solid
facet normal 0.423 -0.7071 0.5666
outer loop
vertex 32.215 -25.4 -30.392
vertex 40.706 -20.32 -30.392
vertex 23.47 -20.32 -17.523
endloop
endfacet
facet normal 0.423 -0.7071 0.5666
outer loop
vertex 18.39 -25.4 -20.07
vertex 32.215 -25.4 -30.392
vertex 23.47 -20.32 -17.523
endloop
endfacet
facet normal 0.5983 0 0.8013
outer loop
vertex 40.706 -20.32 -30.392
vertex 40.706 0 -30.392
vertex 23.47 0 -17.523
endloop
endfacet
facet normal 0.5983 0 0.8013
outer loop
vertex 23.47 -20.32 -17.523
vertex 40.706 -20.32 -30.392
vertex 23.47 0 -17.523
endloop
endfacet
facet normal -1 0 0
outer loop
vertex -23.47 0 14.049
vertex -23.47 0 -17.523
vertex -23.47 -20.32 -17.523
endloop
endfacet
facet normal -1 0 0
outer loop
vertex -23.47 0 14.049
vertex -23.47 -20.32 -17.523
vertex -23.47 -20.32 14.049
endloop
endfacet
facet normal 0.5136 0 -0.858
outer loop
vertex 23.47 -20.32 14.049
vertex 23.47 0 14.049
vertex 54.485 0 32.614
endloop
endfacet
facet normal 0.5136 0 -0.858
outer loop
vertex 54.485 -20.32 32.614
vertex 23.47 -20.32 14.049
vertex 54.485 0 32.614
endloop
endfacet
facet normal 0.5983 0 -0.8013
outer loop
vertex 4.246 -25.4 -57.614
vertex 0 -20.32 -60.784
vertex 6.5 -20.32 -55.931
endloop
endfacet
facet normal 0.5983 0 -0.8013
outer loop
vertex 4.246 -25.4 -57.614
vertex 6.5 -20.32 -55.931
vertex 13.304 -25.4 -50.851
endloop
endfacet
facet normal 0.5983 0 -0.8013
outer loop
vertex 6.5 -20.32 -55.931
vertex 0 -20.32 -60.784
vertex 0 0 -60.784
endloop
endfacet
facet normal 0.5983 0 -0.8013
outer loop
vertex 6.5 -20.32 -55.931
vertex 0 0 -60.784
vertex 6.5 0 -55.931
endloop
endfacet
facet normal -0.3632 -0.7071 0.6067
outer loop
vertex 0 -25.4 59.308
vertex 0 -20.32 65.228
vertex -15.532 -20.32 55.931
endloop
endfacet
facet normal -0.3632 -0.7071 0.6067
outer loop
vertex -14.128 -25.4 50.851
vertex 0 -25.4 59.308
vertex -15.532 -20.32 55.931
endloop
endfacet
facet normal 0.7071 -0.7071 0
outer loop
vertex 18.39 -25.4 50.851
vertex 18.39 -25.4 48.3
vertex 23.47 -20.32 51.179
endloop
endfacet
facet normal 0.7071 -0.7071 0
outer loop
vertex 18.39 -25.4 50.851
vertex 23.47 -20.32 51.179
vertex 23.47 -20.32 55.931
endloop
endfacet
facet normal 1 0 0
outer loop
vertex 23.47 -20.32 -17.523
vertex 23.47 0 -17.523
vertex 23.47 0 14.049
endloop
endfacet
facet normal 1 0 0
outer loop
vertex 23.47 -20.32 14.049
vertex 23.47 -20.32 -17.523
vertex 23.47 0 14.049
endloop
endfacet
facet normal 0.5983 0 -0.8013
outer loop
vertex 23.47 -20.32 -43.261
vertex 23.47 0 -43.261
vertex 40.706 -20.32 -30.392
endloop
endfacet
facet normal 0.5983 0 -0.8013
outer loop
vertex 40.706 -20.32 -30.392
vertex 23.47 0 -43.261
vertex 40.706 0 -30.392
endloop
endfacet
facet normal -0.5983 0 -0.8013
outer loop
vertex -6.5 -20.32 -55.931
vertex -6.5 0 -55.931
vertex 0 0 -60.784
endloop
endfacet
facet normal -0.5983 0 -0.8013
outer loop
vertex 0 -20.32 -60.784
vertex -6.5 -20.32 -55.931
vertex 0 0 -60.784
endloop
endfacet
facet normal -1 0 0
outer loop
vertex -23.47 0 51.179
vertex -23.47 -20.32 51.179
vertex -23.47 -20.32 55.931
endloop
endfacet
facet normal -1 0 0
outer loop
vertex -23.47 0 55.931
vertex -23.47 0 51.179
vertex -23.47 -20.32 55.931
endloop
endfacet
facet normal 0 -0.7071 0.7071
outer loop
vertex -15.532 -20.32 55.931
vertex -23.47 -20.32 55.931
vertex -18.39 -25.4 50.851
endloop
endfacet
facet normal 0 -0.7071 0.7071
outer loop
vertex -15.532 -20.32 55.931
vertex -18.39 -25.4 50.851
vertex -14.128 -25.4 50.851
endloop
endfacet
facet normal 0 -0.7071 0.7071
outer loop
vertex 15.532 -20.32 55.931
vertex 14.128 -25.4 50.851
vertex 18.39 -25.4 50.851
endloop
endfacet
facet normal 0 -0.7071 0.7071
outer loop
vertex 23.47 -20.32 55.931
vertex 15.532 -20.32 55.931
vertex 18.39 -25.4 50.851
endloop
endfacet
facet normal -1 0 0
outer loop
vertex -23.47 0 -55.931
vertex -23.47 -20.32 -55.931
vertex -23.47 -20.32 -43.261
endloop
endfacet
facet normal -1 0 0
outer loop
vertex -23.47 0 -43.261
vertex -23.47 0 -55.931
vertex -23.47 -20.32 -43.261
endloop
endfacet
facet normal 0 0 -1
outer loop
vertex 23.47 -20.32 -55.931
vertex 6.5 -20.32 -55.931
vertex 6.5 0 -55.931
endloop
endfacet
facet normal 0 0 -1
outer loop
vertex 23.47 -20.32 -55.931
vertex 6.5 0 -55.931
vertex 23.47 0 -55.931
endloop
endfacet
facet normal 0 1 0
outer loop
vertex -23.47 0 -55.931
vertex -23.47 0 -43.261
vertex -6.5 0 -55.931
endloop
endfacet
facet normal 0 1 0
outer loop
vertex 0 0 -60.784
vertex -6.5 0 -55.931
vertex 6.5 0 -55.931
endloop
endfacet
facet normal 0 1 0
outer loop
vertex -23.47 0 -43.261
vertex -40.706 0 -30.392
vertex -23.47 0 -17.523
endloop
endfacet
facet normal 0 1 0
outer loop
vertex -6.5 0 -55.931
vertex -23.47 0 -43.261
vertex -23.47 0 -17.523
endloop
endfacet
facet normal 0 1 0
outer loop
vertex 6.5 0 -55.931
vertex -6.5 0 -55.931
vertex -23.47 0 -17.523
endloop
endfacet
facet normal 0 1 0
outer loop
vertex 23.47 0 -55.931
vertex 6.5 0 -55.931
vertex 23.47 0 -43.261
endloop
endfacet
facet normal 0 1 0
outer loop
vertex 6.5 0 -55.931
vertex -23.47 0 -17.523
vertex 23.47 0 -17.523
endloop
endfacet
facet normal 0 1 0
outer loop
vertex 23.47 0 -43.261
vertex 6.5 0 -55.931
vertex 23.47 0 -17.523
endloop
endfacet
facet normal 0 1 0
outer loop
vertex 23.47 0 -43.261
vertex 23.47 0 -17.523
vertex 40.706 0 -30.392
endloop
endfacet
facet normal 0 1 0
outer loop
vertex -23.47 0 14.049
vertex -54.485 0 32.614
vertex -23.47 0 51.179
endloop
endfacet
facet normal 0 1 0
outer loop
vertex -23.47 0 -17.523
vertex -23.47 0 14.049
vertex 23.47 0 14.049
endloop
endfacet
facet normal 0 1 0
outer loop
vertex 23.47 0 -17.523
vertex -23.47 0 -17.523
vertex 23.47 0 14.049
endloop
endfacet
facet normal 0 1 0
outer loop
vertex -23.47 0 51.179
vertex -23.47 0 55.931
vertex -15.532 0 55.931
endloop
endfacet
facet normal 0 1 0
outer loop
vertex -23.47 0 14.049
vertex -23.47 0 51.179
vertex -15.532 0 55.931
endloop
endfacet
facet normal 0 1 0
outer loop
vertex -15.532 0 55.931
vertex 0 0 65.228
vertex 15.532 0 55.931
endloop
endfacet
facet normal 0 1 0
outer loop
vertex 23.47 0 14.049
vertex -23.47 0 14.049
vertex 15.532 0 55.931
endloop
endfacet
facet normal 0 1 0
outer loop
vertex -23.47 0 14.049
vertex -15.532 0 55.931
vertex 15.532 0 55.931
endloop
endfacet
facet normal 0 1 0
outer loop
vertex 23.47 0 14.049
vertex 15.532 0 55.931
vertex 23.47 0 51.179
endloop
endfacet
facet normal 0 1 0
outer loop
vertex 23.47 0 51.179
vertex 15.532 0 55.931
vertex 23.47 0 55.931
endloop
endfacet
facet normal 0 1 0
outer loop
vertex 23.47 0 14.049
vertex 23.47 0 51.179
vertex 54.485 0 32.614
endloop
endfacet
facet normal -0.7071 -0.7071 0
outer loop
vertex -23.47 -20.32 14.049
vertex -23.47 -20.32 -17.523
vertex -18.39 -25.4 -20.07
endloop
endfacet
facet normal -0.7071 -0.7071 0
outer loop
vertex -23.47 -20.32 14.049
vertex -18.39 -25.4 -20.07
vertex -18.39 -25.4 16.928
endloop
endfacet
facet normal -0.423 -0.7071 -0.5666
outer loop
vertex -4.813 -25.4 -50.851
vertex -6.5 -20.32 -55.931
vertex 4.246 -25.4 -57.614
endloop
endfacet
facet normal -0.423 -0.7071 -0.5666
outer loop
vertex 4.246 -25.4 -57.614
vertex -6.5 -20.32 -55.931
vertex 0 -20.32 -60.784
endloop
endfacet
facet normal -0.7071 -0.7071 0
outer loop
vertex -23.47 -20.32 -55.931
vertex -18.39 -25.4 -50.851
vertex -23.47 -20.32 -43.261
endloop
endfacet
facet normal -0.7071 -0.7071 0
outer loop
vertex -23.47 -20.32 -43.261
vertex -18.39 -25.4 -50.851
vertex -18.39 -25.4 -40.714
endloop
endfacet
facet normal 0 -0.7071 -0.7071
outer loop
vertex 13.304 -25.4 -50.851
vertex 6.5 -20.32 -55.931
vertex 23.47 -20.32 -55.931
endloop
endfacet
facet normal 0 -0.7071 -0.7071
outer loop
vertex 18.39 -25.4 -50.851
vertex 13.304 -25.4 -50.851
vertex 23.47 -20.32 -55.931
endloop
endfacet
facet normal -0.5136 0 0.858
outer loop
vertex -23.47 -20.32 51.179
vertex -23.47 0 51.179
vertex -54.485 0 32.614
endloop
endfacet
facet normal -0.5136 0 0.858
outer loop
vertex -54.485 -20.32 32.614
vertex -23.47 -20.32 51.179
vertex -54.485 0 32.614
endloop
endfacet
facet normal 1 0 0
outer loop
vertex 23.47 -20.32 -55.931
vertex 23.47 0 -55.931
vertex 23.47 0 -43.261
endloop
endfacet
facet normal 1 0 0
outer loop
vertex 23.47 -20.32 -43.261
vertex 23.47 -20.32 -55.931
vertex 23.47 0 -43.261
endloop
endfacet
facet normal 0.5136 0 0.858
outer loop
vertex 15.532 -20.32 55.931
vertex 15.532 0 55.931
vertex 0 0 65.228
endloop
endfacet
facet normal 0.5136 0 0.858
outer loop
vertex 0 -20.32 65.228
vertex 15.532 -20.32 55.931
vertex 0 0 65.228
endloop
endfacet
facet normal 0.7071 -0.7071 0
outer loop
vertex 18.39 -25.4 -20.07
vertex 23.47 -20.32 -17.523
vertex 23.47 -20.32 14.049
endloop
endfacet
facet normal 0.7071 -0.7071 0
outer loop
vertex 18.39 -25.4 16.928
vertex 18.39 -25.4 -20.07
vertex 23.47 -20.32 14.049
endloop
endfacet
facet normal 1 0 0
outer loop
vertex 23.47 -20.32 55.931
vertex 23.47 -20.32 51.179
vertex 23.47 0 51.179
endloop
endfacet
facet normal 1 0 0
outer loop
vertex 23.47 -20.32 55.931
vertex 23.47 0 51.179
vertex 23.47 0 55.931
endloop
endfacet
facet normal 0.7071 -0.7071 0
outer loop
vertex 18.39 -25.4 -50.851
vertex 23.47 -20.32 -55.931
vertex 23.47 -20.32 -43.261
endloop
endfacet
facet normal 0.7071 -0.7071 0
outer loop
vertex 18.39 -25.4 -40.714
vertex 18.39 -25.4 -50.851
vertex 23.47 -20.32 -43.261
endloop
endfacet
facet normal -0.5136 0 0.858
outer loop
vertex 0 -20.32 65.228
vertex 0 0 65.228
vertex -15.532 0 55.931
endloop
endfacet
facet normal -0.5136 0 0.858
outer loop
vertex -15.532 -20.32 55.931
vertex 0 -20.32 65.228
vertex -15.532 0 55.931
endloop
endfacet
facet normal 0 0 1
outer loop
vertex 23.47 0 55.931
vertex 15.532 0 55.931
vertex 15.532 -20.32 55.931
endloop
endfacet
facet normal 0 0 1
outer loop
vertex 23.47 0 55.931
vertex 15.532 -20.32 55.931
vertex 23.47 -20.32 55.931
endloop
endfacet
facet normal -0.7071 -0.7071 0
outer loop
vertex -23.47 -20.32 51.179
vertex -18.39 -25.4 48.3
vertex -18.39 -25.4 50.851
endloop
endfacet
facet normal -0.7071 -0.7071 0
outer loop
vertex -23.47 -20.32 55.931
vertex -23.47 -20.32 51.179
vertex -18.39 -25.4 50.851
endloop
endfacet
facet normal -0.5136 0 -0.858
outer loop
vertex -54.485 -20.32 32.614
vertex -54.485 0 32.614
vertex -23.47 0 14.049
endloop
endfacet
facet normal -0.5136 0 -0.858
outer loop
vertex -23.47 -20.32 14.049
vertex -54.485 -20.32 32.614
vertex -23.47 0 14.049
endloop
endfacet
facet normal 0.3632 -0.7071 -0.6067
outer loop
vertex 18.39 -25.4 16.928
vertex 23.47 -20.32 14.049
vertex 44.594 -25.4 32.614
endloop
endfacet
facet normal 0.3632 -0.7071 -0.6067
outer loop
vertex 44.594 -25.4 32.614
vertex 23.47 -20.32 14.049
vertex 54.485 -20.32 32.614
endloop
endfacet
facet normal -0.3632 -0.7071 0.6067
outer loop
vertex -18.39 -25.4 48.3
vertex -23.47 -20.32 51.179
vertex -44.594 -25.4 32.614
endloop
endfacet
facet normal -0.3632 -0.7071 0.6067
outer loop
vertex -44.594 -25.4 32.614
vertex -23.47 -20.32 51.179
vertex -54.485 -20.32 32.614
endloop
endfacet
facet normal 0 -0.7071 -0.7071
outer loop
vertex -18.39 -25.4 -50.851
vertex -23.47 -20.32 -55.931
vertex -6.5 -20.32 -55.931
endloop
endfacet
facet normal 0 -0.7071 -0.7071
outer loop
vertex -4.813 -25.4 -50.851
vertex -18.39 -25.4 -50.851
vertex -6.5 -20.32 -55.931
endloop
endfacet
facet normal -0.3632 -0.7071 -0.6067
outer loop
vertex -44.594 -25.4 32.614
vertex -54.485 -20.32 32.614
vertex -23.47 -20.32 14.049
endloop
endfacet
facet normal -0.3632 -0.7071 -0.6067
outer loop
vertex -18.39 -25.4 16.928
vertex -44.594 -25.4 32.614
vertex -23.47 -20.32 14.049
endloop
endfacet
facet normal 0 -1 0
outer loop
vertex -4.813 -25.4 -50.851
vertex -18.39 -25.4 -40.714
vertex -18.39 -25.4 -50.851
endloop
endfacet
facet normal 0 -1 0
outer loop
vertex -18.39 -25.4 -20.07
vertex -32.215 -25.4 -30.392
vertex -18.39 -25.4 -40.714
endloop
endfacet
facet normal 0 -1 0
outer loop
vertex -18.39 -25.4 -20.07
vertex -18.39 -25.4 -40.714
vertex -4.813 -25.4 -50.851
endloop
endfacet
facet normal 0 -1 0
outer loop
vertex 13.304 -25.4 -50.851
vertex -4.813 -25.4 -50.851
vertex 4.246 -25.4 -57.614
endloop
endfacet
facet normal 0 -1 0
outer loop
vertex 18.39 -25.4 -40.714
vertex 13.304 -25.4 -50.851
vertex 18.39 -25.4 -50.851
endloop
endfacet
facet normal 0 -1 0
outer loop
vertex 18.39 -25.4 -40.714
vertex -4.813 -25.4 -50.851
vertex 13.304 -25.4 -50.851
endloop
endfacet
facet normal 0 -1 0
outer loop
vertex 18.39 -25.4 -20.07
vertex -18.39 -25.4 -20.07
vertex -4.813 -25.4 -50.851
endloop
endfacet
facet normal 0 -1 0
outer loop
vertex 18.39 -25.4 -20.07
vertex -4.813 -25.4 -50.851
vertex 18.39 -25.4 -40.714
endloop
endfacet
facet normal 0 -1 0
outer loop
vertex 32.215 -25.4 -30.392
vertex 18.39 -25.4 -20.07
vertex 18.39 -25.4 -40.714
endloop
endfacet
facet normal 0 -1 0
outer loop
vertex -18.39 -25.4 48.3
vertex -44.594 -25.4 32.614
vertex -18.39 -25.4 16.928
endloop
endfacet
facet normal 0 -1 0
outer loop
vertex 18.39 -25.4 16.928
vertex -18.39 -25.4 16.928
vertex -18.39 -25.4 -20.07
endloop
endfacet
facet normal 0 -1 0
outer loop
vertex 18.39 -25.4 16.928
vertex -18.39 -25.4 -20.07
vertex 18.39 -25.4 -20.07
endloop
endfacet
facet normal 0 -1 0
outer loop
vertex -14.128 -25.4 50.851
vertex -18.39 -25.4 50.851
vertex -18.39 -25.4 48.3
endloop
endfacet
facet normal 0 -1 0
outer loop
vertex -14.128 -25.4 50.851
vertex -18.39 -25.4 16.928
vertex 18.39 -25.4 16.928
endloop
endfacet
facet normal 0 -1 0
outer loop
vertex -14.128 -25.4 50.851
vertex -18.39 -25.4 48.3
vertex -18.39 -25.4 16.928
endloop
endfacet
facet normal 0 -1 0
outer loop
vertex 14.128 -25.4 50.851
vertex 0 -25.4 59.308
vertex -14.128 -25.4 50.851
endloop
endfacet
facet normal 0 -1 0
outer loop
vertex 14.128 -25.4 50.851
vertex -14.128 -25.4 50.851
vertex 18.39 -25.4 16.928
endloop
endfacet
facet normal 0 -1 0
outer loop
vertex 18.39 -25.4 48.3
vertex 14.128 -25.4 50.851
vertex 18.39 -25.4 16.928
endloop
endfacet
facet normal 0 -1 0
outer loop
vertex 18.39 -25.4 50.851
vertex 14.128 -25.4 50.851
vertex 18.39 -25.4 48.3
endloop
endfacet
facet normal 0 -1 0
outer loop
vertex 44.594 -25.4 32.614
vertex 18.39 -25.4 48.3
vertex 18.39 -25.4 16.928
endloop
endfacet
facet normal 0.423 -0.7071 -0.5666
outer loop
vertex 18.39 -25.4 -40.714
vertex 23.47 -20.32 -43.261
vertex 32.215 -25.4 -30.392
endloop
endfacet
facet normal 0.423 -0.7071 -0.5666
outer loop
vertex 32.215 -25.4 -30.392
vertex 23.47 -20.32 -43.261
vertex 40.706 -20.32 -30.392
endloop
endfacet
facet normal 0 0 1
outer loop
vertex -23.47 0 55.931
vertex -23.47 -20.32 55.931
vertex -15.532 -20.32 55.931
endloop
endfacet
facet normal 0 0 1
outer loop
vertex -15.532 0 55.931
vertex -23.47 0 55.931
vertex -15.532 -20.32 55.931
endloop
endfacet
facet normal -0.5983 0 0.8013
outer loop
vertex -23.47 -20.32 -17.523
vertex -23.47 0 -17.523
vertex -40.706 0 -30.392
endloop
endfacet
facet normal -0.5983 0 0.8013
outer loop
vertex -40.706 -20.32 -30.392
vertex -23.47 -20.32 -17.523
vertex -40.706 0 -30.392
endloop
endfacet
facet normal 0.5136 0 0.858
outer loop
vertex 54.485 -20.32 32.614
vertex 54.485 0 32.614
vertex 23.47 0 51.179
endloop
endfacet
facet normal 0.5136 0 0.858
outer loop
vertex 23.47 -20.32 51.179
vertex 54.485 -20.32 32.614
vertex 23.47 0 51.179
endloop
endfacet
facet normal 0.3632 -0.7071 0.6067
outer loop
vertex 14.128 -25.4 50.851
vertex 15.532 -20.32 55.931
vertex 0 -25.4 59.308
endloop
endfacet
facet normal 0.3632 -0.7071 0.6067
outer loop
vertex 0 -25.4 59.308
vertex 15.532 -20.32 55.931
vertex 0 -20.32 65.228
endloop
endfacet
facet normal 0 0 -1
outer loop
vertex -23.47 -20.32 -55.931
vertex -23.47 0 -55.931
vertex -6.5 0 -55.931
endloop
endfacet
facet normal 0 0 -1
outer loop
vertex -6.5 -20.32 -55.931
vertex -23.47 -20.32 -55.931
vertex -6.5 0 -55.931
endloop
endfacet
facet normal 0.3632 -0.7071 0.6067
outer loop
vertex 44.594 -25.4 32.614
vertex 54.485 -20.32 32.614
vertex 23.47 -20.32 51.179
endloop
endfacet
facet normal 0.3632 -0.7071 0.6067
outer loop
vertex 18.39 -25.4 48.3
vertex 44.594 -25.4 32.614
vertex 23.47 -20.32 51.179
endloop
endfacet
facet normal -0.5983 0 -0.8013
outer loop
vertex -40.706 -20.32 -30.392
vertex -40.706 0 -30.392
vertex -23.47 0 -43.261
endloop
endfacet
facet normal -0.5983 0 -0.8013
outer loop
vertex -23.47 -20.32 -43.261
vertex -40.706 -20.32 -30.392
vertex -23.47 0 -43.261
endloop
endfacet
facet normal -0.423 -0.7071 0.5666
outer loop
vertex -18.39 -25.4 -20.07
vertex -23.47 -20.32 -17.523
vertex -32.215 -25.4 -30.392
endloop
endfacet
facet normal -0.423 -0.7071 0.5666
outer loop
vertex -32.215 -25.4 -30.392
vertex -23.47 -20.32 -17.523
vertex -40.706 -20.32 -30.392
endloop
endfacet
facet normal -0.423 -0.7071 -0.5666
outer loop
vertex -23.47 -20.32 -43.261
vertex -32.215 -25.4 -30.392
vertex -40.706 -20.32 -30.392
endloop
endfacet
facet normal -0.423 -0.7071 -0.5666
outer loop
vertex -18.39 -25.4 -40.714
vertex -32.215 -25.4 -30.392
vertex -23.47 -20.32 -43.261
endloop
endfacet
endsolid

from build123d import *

# Parameters (mm, degrees)
F0_W     = 46.9391979277
F0_H     = 111.8616014719
F3_DEPTH = 25.4
F4_DEPTH = 25.4
F5_DEPTH = 25.4
F6_SIZE  = 5.08


with BuildPart() as f3:
    # F0 (on Front) → F3 (new body)
    with BuildSketch(Plane.XZ):
        Rectangle(F0_W, F0_H)
    extrude(amount=F3_DEPTH)

    # F1 (on face) → F4 (join)
    with BuildSketch(Plane.XZ):
        Polygon((-54.4846235865, 32.6140428748), (0, 0), (54.4846235865, 32.6140428748), (0, 65.2280857495), align=None)
    extrude(amount=F4_DEPTH)

    # F2 (on Front) → F5 (join)
    with BuildSketch(Plane.XZ):
        Polygon((-40.705913781, -30.3919164129), (0, -60.7838328259), (40.705913781, -30.3919164129), (0, 0), align=None)
    extrude(amount=F5_DEPTH)

    # F6
    f6_edges = [f3.edges().sort_by_distance(p)[0] for p in [
        (-38.977111, -25.4, 23.331375),
        (-23.469599, -25.4, -1.737102),
        (-32.087756, -25.4, -23.957414),
        (-32.087756, -25.4, -36.826419),
        (-23.469599, -25.4, -49.595861),
        (-14.984794, -25.4, -55.930801),
        (-3.249994, -25.4, -58.357317),
        (14.984794, -25.4, -55.930801),
        (23.469599, -25.4, -49.595861),
        (32.087756, -25.4, -36.826419),
        (32.087756, -25.4, -23.957414),
        (23.469599, -25.4, -1.737102),
        (38.977111, -25.4, 23.331375),
        (38.977111, -25.4, 41.896711),
        (23.469599, -25.4, 53.55509),
        (19.500765, -25.4, 55.930801),
        (7.765966, -25.4, 60.579443),
        (-7.765966, -25.4, 60.579443),
        (-19.500765, -25.4, 55.930801),
        (-23.469599, -25.4, 53.55509),
        (-38.977111, -25.4, 41.896711),
    ]]
    chamfer(f6_edges, length=F6_SIZE)


solid = f3.part
